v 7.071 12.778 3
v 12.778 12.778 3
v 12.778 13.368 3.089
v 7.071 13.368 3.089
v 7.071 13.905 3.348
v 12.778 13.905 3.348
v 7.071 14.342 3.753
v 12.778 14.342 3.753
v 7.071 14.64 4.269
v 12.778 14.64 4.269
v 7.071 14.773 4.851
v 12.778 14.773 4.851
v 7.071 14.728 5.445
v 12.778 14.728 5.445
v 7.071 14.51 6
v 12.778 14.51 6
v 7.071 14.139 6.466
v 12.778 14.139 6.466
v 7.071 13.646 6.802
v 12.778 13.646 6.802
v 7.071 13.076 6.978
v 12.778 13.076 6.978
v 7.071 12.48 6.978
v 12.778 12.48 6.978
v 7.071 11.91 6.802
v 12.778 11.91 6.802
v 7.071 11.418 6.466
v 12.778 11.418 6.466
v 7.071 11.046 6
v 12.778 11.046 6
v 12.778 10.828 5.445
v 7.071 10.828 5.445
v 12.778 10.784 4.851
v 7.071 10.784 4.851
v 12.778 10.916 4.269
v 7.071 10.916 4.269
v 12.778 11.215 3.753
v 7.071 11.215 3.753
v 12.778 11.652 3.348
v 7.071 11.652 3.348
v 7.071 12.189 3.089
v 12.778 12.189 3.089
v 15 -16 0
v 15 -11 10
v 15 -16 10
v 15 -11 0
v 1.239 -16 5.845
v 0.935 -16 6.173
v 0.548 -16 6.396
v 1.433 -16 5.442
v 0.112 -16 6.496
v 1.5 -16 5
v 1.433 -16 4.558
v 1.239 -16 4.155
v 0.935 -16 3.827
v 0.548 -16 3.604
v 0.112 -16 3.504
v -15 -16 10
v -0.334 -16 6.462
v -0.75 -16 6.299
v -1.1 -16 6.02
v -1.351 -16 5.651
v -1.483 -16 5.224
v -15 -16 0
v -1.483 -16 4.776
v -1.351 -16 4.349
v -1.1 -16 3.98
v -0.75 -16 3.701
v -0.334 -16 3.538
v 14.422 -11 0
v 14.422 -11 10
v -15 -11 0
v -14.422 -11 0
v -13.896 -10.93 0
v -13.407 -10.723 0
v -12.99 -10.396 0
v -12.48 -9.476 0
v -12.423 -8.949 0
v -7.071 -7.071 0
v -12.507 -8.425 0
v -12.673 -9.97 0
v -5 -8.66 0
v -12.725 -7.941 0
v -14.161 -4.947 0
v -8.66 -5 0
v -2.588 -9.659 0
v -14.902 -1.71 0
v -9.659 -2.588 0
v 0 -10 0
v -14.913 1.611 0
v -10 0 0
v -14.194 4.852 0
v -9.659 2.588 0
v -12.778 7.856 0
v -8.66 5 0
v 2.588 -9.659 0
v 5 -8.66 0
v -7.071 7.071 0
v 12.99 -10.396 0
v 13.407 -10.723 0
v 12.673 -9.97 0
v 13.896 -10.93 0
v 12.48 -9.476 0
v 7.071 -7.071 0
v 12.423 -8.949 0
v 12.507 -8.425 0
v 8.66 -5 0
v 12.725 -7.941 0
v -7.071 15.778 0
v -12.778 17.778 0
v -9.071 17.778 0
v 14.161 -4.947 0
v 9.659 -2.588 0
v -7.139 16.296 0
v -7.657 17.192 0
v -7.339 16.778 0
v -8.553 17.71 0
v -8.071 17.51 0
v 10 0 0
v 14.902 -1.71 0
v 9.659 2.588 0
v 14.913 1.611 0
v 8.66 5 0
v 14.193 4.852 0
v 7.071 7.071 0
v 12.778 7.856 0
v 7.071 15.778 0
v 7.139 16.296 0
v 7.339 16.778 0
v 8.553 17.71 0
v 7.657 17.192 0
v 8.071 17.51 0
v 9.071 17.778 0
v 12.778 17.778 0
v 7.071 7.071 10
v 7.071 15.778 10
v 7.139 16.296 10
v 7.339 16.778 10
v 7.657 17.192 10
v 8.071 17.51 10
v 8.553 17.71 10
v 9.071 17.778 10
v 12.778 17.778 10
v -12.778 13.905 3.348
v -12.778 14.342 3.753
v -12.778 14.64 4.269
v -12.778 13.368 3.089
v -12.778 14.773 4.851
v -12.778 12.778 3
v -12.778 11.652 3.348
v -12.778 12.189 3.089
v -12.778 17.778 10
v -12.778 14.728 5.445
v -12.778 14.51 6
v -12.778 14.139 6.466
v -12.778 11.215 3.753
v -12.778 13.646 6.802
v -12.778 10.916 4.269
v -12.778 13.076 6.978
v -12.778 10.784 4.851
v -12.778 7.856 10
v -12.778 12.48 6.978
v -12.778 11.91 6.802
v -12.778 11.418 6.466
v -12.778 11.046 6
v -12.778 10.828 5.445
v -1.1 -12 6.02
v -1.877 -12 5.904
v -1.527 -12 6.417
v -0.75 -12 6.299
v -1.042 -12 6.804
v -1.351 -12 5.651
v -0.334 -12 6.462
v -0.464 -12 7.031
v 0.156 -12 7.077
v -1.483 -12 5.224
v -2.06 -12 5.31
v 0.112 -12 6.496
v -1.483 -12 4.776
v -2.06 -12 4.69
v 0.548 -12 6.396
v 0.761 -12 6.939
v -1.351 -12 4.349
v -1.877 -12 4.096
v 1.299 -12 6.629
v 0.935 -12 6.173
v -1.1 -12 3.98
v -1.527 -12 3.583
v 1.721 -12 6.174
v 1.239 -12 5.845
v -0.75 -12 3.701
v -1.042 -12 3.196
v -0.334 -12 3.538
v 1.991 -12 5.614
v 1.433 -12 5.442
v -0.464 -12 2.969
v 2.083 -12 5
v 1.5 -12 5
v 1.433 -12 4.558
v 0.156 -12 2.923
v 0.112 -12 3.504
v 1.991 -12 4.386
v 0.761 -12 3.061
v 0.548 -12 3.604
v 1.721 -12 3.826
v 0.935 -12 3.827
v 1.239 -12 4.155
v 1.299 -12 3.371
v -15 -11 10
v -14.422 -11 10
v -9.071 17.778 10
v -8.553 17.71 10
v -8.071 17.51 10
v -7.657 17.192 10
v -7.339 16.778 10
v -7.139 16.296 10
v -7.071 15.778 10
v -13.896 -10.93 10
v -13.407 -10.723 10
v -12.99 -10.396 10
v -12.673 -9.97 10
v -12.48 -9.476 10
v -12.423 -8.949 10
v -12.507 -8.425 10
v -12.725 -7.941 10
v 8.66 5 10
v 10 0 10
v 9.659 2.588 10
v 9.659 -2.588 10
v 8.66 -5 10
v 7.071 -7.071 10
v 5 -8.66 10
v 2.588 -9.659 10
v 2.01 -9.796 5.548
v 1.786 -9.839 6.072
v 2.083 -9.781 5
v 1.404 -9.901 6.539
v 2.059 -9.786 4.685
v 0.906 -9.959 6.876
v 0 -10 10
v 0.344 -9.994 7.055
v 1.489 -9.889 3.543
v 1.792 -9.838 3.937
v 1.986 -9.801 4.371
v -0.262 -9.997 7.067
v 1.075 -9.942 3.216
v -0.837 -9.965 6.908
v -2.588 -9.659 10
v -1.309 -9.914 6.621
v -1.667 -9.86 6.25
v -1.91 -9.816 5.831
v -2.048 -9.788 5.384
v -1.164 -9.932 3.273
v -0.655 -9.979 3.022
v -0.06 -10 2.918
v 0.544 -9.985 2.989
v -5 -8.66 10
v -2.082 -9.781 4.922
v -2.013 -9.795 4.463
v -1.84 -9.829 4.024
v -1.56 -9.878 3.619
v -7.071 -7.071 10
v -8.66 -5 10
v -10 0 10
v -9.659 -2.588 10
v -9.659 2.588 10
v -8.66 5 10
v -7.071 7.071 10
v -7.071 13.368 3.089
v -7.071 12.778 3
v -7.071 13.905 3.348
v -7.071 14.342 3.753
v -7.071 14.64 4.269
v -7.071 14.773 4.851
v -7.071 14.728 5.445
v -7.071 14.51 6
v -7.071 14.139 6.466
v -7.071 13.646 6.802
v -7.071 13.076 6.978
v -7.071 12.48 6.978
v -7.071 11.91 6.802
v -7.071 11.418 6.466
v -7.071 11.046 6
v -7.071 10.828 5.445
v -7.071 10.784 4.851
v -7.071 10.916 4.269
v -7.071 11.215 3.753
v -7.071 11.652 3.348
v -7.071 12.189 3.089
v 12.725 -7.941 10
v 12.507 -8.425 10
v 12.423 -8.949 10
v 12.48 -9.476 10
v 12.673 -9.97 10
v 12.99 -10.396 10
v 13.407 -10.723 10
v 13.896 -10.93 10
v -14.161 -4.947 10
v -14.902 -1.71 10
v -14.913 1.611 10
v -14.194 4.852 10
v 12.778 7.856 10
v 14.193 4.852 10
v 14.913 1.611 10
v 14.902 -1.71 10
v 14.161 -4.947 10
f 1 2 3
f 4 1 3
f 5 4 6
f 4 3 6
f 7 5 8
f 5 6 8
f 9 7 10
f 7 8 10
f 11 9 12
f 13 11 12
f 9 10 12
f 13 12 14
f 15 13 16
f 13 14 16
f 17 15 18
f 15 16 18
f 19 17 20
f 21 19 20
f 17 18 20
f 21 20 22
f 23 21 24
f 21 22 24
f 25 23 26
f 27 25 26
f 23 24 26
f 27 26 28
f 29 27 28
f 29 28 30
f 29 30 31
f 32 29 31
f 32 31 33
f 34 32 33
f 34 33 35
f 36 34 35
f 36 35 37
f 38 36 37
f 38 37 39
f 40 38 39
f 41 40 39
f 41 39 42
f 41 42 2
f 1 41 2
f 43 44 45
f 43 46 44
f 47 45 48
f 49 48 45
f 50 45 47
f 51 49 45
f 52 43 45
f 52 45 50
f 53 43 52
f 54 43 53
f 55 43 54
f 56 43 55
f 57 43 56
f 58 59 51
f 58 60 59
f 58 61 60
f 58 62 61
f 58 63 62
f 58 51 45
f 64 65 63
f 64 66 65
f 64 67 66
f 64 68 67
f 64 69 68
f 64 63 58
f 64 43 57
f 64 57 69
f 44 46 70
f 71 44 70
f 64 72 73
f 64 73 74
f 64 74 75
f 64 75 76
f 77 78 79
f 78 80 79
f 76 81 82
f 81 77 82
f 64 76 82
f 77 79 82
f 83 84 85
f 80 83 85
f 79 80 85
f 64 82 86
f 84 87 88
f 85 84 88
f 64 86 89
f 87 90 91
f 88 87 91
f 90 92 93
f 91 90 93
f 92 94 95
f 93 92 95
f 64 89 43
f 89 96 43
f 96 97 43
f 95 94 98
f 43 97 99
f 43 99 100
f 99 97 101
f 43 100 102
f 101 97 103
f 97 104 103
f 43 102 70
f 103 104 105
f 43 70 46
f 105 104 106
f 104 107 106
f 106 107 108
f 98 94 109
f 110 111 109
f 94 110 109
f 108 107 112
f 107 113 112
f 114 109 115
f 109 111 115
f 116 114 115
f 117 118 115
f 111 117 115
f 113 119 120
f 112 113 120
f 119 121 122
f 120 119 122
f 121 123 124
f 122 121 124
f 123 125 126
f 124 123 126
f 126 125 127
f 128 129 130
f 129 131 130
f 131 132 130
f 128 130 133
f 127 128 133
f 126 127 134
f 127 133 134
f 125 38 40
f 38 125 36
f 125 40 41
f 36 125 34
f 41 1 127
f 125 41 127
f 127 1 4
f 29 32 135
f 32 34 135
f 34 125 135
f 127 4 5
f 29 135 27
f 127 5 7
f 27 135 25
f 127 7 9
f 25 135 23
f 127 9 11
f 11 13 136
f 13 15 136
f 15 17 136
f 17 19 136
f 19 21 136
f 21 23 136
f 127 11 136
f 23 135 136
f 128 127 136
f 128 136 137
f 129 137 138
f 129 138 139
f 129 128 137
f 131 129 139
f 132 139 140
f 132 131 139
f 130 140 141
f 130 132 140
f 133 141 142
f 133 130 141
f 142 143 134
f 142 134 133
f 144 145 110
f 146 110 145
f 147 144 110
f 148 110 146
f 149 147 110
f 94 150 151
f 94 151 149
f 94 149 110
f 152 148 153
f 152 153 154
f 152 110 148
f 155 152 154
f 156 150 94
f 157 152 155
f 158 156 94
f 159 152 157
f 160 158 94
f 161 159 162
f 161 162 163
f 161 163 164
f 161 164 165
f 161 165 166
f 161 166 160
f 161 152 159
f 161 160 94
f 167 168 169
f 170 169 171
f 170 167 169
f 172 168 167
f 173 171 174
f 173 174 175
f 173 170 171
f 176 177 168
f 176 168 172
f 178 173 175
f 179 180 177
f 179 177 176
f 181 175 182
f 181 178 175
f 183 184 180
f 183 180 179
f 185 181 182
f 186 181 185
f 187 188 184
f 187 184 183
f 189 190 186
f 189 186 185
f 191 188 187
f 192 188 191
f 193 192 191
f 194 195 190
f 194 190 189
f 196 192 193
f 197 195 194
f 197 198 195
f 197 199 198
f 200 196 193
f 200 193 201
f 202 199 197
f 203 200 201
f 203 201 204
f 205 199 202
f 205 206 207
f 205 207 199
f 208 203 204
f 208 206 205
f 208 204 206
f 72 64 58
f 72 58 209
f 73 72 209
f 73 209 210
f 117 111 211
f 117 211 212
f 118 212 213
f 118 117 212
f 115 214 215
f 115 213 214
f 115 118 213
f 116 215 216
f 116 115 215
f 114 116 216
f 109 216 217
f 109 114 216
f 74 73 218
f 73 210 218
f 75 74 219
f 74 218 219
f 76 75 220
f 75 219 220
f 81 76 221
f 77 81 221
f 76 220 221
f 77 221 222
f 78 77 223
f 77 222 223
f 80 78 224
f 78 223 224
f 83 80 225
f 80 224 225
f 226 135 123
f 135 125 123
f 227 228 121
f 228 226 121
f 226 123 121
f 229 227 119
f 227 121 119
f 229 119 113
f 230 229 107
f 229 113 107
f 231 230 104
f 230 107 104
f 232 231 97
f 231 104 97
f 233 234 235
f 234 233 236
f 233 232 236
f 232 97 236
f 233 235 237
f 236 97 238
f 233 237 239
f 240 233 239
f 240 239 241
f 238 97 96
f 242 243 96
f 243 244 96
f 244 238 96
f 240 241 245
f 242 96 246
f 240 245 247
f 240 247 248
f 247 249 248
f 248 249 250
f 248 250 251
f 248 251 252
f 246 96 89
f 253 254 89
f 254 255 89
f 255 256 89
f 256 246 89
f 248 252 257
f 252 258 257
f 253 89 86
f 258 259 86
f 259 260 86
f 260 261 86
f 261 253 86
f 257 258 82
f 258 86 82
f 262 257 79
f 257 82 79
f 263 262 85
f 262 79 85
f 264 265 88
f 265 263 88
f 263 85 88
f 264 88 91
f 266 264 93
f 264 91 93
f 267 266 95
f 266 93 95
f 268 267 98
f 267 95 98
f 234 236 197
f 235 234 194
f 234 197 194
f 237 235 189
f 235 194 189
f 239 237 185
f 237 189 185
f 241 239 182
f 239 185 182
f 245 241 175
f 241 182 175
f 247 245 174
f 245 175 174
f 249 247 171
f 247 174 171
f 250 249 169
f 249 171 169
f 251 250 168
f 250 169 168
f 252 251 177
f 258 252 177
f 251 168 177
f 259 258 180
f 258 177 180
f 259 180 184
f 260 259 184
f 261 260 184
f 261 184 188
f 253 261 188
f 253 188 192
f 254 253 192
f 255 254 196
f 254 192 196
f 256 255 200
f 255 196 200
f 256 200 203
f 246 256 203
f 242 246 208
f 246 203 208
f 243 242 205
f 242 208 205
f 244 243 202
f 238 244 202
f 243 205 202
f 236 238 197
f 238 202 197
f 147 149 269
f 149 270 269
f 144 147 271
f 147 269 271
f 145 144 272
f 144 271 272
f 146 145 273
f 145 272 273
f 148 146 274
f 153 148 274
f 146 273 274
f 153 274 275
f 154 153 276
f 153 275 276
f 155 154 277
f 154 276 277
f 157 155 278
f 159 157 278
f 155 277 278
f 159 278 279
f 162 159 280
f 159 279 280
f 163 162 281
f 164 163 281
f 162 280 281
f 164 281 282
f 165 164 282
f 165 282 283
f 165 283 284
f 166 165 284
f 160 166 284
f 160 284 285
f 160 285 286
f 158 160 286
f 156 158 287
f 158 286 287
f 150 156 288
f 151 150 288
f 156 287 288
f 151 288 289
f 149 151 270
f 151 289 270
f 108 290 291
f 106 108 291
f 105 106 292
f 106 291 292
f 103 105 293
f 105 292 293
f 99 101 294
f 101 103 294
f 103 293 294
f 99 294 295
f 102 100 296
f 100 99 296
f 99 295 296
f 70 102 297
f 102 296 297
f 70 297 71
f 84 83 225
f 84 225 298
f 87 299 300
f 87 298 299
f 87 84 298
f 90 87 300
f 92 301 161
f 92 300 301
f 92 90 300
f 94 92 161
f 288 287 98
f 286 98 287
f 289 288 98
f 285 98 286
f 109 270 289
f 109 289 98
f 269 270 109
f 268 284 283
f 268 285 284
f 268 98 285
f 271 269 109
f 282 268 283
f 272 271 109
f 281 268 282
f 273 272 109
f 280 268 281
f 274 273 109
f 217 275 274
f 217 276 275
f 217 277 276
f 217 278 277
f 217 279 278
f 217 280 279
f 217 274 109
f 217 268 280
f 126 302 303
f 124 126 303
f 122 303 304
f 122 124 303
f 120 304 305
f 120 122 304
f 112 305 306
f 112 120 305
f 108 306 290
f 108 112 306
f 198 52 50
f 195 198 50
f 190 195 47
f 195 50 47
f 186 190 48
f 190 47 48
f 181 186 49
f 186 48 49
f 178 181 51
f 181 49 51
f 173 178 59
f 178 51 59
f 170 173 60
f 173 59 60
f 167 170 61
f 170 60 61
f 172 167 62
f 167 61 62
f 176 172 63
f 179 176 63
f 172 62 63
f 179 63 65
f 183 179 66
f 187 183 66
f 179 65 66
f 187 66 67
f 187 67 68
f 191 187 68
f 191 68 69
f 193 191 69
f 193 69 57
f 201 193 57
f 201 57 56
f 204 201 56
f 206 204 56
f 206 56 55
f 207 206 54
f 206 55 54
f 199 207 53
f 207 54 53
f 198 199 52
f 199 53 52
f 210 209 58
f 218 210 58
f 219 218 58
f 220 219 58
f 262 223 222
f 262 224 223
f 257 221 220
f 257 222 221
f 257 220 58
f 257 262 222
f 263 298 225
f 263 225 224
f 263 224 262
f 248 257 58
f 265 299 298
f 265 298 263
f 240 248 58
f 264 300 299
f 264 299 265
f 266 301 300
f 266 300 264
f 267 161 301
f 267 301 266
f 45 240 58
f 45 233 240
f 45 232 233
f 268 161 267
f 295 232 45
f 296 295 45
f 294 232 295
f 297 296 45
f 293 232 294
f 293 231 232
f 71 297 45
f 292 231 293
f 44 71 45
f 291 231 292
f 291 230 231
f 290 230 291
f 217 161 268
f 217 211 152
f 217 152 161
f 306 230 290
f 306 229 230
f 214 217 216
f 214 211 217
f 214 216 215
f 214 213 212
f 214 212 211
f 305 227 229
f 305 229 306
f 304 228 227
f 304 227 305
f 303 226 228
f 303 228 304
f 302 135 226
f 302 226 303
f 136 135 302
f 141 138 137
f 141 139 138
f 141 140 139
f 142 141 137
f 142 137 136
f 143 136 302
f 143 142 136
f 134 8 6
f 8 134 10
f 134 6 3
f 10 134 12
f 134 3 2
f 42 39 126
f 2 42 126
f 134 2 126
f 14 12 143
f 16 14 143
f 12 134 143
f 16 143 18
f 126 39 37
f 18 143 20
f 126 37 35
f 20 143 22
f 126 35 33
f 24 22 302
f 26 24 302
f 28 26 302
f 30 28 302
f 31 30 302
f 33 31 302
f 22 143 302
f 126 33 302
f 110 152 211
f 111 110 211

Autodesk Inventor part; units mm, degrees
ref_plane "YZ Plane" through (0, 0, 0) normal (1, 0, 0) x (0, 1, 0)
ref_plane "XZ Plane" through (0, 0, 0) normal (0, 1, 0) x (-1, 0, 0)
ref_plane "XY Plane" through (0, 0, 0) normal (0, 0, 1) x (1, 0, 0)
sketch "Sketch1" plane through (0, 0, 0) normal (0, 0, 1) x (1, 0, 0)
  line L0 (0, 0) -> (15.5887, 0) construction
  line L1 (0, 0) -> (20, 0) construction
  line L2 (15, -11) -> (15, -16)
  line L3 (15, -16) -> (-15, -16)
  line L4 (-15, -16) -> (-15, -11)
  line L5 (-15, -11) -> (-10.198, -11)
  arc A0 (-10.6066, 10.6066) -> (-10.198, -11) centre (0, 0) ccw
  arc A1 (10.198, -11) -> (10.6066, 10.6066) centre (0, 0) ccw
  line L6 (15, -11) -> (10.198, -11)
  arc A2 (-7.0711, 7.0711) -> (7.0711, 7.0711) centre (0, 0) ccw
  line L7 (10.6066, 10.6066) -> (7.0711, 7.0711)
  line L8 (-7.0711, 7.0711) -> (-10.6066, 10.6066)
  dimension "d6" = 5
  dimension "d7" = 30
  dimension "d35" = 20
extrude "Extrusion1" add sketch "Sketch1" along normal blind 10
sketch "Sketch2" plane through (-15, -16, 0) normal (0, -1, 0) x (1, 0, 0)
  line L0 (0, 10) -> (30, 10) projected
  line L1 (30, 10) -> (25.198, 10) projected
  line L2 (0, 0) -> (30, 0) projected
  circle A0 centre (15, 5) radius 1.5
  point P0 (15, 0)
  dimension "d10" = 3
extrude "Extrusion2" cut sketch "Sketch2" against normal blind 24.75
sketch "Sketch3" plane through (10.198, -11, 0) normal (0, 1, 0) x (1, 0, 0)
  line L0 (4.802, 0) -> (0, 0) projected
  line L1 (-20.3961, -10) -> (-25.198, -10) projected
  line L2 (-20.3961, 0) -> (-25.198, 0) projected
  line L3 (4.802, -10) -> (0, -10) projected
  circle A0 centre (-10.198, -5) radius 2.0833
  point P0 (-10.198, 0)
sketch "Sketch4" plane through (0, 0, 0) normal (0, 0, -1) x (-1, 0, 0)
  point P0 (0, 0)
extrude "Extrusion3" cut sketch "Sketch3" against normal blind 1
sketch "Sketch5" plane through (10.198, -11, 0) normal (0, -1, 0) x (1, 0, 0)
  circle A0 centre (-10.198, 5) radius 1.5 projected
  circle A1 centre (-10.198, 5) radius 2.0833 projected
  circle A2 centre (-10.198, 5) radius 2.0833
  point P0 (-10.198, 0)
  point P1 (-10.198, 6.5)
  point P2 (-10.198, 3.5)
  point P3 (-10.198, 2.9167)
  point P4 (-10.198, 7.0833)
  point P5 (-10.198, 2.9167)
extrude "Extrusion4" cut sketch "Sketch5" against normal blind 1.5 contours A0 | A1
fillet "Fillet1" radius 2 1 edges at (-10.198, -11, 5)
fillet "Fillet2" radius 2 1 edges at (10.198, -11, 5)
sketch "Sketch6" plane through (0, 0, 10) normal (0, 0, 1) x (1, 0, 0)
  line L0 (-7.7782, 7.7782) -> (-10.6066, 10.6066) projected
  line L1 (-12.7782, 17.7782) -> (-12.7782, 7.8561)
  arc A0 (-10.6066, 10.6066) -> (-12.7255, -7.9412) centre (0, 0) ccw projected
  arc A1 (-7.0711, 7.0711) -> (7.0711, 7.0711) centre (0, 0) ccw construction
  line L2 (-7.0711, 7.0711) -> (-10.6066, 10.6066) projected
  line L3 (-7.0711, 7.0711) -> (-7.0711, 17.7782)
  line L4 (-12.7782, 17.7782) -> (-7.0711, 17.7782)
extrude "Extrusion5" add sketch "Sketch6" against normal blind 10
sketch "Sketch7" plane through (0, 0, 10) normal (0, 0, 1) x (1, 0, 0)
  line L0 (12.7782, 17.7782) -> (12.7782, 7.8561)
  arc A0 (12.7255, -7.9412) -> (10.6066, 10.6066) centre (0, 0) ccw projected
  arc A1 (-7.7782, 7.7782) -> (7.7782, 7.7782) centre (0, 0) ccw projected
  arc A2 (-7.0711, 7.0711) -> (7.0711, 7.0711) centre (0, 0) ccw projected
  line L1 (7.0711, 7.0711) -> (7.0711, 17.7782)
  line L2 (12.7782, 17.7782) -> (7.0711, 17.7782)
  line L3 (7.0711, 7.0711) -> (12.7782, 7.8561)
extrude "Extrusion6" add sketch "Sketch7" against normal blind 10
sketch "Sketch8" plane through (12.7782, 7.8561, 10) normal (1, 0, 0) x (0, 0, -1)
  line L0 (0, 9.9221) -> (0, 0) construction
  line L1 (10, -0.0779) -> (0, -0.0779) construction
  line L2 (0, 9.9221) -> (10, -0.0779) construction
  line L3 (0, 9.9221) -> (10, 9.9221) construction
  line L4 (10, 9.9221) -> (0, -0.0779) construction
  circle A0 centre (5, 4.9221) radius 2
  point P0 (10, -7.8561)
  dimension "d28" = 4
extrude "Extrusion7" cut sketch "Sketch8" against normal blind 36
fillet "Fillet9" radius 2 1 edges at (-7.0711, 17.7782, 5)
fillet "Fillet10" radius 2 1 edges at (7.0711, 17.7782, 5)
properties part number "buisClip"
